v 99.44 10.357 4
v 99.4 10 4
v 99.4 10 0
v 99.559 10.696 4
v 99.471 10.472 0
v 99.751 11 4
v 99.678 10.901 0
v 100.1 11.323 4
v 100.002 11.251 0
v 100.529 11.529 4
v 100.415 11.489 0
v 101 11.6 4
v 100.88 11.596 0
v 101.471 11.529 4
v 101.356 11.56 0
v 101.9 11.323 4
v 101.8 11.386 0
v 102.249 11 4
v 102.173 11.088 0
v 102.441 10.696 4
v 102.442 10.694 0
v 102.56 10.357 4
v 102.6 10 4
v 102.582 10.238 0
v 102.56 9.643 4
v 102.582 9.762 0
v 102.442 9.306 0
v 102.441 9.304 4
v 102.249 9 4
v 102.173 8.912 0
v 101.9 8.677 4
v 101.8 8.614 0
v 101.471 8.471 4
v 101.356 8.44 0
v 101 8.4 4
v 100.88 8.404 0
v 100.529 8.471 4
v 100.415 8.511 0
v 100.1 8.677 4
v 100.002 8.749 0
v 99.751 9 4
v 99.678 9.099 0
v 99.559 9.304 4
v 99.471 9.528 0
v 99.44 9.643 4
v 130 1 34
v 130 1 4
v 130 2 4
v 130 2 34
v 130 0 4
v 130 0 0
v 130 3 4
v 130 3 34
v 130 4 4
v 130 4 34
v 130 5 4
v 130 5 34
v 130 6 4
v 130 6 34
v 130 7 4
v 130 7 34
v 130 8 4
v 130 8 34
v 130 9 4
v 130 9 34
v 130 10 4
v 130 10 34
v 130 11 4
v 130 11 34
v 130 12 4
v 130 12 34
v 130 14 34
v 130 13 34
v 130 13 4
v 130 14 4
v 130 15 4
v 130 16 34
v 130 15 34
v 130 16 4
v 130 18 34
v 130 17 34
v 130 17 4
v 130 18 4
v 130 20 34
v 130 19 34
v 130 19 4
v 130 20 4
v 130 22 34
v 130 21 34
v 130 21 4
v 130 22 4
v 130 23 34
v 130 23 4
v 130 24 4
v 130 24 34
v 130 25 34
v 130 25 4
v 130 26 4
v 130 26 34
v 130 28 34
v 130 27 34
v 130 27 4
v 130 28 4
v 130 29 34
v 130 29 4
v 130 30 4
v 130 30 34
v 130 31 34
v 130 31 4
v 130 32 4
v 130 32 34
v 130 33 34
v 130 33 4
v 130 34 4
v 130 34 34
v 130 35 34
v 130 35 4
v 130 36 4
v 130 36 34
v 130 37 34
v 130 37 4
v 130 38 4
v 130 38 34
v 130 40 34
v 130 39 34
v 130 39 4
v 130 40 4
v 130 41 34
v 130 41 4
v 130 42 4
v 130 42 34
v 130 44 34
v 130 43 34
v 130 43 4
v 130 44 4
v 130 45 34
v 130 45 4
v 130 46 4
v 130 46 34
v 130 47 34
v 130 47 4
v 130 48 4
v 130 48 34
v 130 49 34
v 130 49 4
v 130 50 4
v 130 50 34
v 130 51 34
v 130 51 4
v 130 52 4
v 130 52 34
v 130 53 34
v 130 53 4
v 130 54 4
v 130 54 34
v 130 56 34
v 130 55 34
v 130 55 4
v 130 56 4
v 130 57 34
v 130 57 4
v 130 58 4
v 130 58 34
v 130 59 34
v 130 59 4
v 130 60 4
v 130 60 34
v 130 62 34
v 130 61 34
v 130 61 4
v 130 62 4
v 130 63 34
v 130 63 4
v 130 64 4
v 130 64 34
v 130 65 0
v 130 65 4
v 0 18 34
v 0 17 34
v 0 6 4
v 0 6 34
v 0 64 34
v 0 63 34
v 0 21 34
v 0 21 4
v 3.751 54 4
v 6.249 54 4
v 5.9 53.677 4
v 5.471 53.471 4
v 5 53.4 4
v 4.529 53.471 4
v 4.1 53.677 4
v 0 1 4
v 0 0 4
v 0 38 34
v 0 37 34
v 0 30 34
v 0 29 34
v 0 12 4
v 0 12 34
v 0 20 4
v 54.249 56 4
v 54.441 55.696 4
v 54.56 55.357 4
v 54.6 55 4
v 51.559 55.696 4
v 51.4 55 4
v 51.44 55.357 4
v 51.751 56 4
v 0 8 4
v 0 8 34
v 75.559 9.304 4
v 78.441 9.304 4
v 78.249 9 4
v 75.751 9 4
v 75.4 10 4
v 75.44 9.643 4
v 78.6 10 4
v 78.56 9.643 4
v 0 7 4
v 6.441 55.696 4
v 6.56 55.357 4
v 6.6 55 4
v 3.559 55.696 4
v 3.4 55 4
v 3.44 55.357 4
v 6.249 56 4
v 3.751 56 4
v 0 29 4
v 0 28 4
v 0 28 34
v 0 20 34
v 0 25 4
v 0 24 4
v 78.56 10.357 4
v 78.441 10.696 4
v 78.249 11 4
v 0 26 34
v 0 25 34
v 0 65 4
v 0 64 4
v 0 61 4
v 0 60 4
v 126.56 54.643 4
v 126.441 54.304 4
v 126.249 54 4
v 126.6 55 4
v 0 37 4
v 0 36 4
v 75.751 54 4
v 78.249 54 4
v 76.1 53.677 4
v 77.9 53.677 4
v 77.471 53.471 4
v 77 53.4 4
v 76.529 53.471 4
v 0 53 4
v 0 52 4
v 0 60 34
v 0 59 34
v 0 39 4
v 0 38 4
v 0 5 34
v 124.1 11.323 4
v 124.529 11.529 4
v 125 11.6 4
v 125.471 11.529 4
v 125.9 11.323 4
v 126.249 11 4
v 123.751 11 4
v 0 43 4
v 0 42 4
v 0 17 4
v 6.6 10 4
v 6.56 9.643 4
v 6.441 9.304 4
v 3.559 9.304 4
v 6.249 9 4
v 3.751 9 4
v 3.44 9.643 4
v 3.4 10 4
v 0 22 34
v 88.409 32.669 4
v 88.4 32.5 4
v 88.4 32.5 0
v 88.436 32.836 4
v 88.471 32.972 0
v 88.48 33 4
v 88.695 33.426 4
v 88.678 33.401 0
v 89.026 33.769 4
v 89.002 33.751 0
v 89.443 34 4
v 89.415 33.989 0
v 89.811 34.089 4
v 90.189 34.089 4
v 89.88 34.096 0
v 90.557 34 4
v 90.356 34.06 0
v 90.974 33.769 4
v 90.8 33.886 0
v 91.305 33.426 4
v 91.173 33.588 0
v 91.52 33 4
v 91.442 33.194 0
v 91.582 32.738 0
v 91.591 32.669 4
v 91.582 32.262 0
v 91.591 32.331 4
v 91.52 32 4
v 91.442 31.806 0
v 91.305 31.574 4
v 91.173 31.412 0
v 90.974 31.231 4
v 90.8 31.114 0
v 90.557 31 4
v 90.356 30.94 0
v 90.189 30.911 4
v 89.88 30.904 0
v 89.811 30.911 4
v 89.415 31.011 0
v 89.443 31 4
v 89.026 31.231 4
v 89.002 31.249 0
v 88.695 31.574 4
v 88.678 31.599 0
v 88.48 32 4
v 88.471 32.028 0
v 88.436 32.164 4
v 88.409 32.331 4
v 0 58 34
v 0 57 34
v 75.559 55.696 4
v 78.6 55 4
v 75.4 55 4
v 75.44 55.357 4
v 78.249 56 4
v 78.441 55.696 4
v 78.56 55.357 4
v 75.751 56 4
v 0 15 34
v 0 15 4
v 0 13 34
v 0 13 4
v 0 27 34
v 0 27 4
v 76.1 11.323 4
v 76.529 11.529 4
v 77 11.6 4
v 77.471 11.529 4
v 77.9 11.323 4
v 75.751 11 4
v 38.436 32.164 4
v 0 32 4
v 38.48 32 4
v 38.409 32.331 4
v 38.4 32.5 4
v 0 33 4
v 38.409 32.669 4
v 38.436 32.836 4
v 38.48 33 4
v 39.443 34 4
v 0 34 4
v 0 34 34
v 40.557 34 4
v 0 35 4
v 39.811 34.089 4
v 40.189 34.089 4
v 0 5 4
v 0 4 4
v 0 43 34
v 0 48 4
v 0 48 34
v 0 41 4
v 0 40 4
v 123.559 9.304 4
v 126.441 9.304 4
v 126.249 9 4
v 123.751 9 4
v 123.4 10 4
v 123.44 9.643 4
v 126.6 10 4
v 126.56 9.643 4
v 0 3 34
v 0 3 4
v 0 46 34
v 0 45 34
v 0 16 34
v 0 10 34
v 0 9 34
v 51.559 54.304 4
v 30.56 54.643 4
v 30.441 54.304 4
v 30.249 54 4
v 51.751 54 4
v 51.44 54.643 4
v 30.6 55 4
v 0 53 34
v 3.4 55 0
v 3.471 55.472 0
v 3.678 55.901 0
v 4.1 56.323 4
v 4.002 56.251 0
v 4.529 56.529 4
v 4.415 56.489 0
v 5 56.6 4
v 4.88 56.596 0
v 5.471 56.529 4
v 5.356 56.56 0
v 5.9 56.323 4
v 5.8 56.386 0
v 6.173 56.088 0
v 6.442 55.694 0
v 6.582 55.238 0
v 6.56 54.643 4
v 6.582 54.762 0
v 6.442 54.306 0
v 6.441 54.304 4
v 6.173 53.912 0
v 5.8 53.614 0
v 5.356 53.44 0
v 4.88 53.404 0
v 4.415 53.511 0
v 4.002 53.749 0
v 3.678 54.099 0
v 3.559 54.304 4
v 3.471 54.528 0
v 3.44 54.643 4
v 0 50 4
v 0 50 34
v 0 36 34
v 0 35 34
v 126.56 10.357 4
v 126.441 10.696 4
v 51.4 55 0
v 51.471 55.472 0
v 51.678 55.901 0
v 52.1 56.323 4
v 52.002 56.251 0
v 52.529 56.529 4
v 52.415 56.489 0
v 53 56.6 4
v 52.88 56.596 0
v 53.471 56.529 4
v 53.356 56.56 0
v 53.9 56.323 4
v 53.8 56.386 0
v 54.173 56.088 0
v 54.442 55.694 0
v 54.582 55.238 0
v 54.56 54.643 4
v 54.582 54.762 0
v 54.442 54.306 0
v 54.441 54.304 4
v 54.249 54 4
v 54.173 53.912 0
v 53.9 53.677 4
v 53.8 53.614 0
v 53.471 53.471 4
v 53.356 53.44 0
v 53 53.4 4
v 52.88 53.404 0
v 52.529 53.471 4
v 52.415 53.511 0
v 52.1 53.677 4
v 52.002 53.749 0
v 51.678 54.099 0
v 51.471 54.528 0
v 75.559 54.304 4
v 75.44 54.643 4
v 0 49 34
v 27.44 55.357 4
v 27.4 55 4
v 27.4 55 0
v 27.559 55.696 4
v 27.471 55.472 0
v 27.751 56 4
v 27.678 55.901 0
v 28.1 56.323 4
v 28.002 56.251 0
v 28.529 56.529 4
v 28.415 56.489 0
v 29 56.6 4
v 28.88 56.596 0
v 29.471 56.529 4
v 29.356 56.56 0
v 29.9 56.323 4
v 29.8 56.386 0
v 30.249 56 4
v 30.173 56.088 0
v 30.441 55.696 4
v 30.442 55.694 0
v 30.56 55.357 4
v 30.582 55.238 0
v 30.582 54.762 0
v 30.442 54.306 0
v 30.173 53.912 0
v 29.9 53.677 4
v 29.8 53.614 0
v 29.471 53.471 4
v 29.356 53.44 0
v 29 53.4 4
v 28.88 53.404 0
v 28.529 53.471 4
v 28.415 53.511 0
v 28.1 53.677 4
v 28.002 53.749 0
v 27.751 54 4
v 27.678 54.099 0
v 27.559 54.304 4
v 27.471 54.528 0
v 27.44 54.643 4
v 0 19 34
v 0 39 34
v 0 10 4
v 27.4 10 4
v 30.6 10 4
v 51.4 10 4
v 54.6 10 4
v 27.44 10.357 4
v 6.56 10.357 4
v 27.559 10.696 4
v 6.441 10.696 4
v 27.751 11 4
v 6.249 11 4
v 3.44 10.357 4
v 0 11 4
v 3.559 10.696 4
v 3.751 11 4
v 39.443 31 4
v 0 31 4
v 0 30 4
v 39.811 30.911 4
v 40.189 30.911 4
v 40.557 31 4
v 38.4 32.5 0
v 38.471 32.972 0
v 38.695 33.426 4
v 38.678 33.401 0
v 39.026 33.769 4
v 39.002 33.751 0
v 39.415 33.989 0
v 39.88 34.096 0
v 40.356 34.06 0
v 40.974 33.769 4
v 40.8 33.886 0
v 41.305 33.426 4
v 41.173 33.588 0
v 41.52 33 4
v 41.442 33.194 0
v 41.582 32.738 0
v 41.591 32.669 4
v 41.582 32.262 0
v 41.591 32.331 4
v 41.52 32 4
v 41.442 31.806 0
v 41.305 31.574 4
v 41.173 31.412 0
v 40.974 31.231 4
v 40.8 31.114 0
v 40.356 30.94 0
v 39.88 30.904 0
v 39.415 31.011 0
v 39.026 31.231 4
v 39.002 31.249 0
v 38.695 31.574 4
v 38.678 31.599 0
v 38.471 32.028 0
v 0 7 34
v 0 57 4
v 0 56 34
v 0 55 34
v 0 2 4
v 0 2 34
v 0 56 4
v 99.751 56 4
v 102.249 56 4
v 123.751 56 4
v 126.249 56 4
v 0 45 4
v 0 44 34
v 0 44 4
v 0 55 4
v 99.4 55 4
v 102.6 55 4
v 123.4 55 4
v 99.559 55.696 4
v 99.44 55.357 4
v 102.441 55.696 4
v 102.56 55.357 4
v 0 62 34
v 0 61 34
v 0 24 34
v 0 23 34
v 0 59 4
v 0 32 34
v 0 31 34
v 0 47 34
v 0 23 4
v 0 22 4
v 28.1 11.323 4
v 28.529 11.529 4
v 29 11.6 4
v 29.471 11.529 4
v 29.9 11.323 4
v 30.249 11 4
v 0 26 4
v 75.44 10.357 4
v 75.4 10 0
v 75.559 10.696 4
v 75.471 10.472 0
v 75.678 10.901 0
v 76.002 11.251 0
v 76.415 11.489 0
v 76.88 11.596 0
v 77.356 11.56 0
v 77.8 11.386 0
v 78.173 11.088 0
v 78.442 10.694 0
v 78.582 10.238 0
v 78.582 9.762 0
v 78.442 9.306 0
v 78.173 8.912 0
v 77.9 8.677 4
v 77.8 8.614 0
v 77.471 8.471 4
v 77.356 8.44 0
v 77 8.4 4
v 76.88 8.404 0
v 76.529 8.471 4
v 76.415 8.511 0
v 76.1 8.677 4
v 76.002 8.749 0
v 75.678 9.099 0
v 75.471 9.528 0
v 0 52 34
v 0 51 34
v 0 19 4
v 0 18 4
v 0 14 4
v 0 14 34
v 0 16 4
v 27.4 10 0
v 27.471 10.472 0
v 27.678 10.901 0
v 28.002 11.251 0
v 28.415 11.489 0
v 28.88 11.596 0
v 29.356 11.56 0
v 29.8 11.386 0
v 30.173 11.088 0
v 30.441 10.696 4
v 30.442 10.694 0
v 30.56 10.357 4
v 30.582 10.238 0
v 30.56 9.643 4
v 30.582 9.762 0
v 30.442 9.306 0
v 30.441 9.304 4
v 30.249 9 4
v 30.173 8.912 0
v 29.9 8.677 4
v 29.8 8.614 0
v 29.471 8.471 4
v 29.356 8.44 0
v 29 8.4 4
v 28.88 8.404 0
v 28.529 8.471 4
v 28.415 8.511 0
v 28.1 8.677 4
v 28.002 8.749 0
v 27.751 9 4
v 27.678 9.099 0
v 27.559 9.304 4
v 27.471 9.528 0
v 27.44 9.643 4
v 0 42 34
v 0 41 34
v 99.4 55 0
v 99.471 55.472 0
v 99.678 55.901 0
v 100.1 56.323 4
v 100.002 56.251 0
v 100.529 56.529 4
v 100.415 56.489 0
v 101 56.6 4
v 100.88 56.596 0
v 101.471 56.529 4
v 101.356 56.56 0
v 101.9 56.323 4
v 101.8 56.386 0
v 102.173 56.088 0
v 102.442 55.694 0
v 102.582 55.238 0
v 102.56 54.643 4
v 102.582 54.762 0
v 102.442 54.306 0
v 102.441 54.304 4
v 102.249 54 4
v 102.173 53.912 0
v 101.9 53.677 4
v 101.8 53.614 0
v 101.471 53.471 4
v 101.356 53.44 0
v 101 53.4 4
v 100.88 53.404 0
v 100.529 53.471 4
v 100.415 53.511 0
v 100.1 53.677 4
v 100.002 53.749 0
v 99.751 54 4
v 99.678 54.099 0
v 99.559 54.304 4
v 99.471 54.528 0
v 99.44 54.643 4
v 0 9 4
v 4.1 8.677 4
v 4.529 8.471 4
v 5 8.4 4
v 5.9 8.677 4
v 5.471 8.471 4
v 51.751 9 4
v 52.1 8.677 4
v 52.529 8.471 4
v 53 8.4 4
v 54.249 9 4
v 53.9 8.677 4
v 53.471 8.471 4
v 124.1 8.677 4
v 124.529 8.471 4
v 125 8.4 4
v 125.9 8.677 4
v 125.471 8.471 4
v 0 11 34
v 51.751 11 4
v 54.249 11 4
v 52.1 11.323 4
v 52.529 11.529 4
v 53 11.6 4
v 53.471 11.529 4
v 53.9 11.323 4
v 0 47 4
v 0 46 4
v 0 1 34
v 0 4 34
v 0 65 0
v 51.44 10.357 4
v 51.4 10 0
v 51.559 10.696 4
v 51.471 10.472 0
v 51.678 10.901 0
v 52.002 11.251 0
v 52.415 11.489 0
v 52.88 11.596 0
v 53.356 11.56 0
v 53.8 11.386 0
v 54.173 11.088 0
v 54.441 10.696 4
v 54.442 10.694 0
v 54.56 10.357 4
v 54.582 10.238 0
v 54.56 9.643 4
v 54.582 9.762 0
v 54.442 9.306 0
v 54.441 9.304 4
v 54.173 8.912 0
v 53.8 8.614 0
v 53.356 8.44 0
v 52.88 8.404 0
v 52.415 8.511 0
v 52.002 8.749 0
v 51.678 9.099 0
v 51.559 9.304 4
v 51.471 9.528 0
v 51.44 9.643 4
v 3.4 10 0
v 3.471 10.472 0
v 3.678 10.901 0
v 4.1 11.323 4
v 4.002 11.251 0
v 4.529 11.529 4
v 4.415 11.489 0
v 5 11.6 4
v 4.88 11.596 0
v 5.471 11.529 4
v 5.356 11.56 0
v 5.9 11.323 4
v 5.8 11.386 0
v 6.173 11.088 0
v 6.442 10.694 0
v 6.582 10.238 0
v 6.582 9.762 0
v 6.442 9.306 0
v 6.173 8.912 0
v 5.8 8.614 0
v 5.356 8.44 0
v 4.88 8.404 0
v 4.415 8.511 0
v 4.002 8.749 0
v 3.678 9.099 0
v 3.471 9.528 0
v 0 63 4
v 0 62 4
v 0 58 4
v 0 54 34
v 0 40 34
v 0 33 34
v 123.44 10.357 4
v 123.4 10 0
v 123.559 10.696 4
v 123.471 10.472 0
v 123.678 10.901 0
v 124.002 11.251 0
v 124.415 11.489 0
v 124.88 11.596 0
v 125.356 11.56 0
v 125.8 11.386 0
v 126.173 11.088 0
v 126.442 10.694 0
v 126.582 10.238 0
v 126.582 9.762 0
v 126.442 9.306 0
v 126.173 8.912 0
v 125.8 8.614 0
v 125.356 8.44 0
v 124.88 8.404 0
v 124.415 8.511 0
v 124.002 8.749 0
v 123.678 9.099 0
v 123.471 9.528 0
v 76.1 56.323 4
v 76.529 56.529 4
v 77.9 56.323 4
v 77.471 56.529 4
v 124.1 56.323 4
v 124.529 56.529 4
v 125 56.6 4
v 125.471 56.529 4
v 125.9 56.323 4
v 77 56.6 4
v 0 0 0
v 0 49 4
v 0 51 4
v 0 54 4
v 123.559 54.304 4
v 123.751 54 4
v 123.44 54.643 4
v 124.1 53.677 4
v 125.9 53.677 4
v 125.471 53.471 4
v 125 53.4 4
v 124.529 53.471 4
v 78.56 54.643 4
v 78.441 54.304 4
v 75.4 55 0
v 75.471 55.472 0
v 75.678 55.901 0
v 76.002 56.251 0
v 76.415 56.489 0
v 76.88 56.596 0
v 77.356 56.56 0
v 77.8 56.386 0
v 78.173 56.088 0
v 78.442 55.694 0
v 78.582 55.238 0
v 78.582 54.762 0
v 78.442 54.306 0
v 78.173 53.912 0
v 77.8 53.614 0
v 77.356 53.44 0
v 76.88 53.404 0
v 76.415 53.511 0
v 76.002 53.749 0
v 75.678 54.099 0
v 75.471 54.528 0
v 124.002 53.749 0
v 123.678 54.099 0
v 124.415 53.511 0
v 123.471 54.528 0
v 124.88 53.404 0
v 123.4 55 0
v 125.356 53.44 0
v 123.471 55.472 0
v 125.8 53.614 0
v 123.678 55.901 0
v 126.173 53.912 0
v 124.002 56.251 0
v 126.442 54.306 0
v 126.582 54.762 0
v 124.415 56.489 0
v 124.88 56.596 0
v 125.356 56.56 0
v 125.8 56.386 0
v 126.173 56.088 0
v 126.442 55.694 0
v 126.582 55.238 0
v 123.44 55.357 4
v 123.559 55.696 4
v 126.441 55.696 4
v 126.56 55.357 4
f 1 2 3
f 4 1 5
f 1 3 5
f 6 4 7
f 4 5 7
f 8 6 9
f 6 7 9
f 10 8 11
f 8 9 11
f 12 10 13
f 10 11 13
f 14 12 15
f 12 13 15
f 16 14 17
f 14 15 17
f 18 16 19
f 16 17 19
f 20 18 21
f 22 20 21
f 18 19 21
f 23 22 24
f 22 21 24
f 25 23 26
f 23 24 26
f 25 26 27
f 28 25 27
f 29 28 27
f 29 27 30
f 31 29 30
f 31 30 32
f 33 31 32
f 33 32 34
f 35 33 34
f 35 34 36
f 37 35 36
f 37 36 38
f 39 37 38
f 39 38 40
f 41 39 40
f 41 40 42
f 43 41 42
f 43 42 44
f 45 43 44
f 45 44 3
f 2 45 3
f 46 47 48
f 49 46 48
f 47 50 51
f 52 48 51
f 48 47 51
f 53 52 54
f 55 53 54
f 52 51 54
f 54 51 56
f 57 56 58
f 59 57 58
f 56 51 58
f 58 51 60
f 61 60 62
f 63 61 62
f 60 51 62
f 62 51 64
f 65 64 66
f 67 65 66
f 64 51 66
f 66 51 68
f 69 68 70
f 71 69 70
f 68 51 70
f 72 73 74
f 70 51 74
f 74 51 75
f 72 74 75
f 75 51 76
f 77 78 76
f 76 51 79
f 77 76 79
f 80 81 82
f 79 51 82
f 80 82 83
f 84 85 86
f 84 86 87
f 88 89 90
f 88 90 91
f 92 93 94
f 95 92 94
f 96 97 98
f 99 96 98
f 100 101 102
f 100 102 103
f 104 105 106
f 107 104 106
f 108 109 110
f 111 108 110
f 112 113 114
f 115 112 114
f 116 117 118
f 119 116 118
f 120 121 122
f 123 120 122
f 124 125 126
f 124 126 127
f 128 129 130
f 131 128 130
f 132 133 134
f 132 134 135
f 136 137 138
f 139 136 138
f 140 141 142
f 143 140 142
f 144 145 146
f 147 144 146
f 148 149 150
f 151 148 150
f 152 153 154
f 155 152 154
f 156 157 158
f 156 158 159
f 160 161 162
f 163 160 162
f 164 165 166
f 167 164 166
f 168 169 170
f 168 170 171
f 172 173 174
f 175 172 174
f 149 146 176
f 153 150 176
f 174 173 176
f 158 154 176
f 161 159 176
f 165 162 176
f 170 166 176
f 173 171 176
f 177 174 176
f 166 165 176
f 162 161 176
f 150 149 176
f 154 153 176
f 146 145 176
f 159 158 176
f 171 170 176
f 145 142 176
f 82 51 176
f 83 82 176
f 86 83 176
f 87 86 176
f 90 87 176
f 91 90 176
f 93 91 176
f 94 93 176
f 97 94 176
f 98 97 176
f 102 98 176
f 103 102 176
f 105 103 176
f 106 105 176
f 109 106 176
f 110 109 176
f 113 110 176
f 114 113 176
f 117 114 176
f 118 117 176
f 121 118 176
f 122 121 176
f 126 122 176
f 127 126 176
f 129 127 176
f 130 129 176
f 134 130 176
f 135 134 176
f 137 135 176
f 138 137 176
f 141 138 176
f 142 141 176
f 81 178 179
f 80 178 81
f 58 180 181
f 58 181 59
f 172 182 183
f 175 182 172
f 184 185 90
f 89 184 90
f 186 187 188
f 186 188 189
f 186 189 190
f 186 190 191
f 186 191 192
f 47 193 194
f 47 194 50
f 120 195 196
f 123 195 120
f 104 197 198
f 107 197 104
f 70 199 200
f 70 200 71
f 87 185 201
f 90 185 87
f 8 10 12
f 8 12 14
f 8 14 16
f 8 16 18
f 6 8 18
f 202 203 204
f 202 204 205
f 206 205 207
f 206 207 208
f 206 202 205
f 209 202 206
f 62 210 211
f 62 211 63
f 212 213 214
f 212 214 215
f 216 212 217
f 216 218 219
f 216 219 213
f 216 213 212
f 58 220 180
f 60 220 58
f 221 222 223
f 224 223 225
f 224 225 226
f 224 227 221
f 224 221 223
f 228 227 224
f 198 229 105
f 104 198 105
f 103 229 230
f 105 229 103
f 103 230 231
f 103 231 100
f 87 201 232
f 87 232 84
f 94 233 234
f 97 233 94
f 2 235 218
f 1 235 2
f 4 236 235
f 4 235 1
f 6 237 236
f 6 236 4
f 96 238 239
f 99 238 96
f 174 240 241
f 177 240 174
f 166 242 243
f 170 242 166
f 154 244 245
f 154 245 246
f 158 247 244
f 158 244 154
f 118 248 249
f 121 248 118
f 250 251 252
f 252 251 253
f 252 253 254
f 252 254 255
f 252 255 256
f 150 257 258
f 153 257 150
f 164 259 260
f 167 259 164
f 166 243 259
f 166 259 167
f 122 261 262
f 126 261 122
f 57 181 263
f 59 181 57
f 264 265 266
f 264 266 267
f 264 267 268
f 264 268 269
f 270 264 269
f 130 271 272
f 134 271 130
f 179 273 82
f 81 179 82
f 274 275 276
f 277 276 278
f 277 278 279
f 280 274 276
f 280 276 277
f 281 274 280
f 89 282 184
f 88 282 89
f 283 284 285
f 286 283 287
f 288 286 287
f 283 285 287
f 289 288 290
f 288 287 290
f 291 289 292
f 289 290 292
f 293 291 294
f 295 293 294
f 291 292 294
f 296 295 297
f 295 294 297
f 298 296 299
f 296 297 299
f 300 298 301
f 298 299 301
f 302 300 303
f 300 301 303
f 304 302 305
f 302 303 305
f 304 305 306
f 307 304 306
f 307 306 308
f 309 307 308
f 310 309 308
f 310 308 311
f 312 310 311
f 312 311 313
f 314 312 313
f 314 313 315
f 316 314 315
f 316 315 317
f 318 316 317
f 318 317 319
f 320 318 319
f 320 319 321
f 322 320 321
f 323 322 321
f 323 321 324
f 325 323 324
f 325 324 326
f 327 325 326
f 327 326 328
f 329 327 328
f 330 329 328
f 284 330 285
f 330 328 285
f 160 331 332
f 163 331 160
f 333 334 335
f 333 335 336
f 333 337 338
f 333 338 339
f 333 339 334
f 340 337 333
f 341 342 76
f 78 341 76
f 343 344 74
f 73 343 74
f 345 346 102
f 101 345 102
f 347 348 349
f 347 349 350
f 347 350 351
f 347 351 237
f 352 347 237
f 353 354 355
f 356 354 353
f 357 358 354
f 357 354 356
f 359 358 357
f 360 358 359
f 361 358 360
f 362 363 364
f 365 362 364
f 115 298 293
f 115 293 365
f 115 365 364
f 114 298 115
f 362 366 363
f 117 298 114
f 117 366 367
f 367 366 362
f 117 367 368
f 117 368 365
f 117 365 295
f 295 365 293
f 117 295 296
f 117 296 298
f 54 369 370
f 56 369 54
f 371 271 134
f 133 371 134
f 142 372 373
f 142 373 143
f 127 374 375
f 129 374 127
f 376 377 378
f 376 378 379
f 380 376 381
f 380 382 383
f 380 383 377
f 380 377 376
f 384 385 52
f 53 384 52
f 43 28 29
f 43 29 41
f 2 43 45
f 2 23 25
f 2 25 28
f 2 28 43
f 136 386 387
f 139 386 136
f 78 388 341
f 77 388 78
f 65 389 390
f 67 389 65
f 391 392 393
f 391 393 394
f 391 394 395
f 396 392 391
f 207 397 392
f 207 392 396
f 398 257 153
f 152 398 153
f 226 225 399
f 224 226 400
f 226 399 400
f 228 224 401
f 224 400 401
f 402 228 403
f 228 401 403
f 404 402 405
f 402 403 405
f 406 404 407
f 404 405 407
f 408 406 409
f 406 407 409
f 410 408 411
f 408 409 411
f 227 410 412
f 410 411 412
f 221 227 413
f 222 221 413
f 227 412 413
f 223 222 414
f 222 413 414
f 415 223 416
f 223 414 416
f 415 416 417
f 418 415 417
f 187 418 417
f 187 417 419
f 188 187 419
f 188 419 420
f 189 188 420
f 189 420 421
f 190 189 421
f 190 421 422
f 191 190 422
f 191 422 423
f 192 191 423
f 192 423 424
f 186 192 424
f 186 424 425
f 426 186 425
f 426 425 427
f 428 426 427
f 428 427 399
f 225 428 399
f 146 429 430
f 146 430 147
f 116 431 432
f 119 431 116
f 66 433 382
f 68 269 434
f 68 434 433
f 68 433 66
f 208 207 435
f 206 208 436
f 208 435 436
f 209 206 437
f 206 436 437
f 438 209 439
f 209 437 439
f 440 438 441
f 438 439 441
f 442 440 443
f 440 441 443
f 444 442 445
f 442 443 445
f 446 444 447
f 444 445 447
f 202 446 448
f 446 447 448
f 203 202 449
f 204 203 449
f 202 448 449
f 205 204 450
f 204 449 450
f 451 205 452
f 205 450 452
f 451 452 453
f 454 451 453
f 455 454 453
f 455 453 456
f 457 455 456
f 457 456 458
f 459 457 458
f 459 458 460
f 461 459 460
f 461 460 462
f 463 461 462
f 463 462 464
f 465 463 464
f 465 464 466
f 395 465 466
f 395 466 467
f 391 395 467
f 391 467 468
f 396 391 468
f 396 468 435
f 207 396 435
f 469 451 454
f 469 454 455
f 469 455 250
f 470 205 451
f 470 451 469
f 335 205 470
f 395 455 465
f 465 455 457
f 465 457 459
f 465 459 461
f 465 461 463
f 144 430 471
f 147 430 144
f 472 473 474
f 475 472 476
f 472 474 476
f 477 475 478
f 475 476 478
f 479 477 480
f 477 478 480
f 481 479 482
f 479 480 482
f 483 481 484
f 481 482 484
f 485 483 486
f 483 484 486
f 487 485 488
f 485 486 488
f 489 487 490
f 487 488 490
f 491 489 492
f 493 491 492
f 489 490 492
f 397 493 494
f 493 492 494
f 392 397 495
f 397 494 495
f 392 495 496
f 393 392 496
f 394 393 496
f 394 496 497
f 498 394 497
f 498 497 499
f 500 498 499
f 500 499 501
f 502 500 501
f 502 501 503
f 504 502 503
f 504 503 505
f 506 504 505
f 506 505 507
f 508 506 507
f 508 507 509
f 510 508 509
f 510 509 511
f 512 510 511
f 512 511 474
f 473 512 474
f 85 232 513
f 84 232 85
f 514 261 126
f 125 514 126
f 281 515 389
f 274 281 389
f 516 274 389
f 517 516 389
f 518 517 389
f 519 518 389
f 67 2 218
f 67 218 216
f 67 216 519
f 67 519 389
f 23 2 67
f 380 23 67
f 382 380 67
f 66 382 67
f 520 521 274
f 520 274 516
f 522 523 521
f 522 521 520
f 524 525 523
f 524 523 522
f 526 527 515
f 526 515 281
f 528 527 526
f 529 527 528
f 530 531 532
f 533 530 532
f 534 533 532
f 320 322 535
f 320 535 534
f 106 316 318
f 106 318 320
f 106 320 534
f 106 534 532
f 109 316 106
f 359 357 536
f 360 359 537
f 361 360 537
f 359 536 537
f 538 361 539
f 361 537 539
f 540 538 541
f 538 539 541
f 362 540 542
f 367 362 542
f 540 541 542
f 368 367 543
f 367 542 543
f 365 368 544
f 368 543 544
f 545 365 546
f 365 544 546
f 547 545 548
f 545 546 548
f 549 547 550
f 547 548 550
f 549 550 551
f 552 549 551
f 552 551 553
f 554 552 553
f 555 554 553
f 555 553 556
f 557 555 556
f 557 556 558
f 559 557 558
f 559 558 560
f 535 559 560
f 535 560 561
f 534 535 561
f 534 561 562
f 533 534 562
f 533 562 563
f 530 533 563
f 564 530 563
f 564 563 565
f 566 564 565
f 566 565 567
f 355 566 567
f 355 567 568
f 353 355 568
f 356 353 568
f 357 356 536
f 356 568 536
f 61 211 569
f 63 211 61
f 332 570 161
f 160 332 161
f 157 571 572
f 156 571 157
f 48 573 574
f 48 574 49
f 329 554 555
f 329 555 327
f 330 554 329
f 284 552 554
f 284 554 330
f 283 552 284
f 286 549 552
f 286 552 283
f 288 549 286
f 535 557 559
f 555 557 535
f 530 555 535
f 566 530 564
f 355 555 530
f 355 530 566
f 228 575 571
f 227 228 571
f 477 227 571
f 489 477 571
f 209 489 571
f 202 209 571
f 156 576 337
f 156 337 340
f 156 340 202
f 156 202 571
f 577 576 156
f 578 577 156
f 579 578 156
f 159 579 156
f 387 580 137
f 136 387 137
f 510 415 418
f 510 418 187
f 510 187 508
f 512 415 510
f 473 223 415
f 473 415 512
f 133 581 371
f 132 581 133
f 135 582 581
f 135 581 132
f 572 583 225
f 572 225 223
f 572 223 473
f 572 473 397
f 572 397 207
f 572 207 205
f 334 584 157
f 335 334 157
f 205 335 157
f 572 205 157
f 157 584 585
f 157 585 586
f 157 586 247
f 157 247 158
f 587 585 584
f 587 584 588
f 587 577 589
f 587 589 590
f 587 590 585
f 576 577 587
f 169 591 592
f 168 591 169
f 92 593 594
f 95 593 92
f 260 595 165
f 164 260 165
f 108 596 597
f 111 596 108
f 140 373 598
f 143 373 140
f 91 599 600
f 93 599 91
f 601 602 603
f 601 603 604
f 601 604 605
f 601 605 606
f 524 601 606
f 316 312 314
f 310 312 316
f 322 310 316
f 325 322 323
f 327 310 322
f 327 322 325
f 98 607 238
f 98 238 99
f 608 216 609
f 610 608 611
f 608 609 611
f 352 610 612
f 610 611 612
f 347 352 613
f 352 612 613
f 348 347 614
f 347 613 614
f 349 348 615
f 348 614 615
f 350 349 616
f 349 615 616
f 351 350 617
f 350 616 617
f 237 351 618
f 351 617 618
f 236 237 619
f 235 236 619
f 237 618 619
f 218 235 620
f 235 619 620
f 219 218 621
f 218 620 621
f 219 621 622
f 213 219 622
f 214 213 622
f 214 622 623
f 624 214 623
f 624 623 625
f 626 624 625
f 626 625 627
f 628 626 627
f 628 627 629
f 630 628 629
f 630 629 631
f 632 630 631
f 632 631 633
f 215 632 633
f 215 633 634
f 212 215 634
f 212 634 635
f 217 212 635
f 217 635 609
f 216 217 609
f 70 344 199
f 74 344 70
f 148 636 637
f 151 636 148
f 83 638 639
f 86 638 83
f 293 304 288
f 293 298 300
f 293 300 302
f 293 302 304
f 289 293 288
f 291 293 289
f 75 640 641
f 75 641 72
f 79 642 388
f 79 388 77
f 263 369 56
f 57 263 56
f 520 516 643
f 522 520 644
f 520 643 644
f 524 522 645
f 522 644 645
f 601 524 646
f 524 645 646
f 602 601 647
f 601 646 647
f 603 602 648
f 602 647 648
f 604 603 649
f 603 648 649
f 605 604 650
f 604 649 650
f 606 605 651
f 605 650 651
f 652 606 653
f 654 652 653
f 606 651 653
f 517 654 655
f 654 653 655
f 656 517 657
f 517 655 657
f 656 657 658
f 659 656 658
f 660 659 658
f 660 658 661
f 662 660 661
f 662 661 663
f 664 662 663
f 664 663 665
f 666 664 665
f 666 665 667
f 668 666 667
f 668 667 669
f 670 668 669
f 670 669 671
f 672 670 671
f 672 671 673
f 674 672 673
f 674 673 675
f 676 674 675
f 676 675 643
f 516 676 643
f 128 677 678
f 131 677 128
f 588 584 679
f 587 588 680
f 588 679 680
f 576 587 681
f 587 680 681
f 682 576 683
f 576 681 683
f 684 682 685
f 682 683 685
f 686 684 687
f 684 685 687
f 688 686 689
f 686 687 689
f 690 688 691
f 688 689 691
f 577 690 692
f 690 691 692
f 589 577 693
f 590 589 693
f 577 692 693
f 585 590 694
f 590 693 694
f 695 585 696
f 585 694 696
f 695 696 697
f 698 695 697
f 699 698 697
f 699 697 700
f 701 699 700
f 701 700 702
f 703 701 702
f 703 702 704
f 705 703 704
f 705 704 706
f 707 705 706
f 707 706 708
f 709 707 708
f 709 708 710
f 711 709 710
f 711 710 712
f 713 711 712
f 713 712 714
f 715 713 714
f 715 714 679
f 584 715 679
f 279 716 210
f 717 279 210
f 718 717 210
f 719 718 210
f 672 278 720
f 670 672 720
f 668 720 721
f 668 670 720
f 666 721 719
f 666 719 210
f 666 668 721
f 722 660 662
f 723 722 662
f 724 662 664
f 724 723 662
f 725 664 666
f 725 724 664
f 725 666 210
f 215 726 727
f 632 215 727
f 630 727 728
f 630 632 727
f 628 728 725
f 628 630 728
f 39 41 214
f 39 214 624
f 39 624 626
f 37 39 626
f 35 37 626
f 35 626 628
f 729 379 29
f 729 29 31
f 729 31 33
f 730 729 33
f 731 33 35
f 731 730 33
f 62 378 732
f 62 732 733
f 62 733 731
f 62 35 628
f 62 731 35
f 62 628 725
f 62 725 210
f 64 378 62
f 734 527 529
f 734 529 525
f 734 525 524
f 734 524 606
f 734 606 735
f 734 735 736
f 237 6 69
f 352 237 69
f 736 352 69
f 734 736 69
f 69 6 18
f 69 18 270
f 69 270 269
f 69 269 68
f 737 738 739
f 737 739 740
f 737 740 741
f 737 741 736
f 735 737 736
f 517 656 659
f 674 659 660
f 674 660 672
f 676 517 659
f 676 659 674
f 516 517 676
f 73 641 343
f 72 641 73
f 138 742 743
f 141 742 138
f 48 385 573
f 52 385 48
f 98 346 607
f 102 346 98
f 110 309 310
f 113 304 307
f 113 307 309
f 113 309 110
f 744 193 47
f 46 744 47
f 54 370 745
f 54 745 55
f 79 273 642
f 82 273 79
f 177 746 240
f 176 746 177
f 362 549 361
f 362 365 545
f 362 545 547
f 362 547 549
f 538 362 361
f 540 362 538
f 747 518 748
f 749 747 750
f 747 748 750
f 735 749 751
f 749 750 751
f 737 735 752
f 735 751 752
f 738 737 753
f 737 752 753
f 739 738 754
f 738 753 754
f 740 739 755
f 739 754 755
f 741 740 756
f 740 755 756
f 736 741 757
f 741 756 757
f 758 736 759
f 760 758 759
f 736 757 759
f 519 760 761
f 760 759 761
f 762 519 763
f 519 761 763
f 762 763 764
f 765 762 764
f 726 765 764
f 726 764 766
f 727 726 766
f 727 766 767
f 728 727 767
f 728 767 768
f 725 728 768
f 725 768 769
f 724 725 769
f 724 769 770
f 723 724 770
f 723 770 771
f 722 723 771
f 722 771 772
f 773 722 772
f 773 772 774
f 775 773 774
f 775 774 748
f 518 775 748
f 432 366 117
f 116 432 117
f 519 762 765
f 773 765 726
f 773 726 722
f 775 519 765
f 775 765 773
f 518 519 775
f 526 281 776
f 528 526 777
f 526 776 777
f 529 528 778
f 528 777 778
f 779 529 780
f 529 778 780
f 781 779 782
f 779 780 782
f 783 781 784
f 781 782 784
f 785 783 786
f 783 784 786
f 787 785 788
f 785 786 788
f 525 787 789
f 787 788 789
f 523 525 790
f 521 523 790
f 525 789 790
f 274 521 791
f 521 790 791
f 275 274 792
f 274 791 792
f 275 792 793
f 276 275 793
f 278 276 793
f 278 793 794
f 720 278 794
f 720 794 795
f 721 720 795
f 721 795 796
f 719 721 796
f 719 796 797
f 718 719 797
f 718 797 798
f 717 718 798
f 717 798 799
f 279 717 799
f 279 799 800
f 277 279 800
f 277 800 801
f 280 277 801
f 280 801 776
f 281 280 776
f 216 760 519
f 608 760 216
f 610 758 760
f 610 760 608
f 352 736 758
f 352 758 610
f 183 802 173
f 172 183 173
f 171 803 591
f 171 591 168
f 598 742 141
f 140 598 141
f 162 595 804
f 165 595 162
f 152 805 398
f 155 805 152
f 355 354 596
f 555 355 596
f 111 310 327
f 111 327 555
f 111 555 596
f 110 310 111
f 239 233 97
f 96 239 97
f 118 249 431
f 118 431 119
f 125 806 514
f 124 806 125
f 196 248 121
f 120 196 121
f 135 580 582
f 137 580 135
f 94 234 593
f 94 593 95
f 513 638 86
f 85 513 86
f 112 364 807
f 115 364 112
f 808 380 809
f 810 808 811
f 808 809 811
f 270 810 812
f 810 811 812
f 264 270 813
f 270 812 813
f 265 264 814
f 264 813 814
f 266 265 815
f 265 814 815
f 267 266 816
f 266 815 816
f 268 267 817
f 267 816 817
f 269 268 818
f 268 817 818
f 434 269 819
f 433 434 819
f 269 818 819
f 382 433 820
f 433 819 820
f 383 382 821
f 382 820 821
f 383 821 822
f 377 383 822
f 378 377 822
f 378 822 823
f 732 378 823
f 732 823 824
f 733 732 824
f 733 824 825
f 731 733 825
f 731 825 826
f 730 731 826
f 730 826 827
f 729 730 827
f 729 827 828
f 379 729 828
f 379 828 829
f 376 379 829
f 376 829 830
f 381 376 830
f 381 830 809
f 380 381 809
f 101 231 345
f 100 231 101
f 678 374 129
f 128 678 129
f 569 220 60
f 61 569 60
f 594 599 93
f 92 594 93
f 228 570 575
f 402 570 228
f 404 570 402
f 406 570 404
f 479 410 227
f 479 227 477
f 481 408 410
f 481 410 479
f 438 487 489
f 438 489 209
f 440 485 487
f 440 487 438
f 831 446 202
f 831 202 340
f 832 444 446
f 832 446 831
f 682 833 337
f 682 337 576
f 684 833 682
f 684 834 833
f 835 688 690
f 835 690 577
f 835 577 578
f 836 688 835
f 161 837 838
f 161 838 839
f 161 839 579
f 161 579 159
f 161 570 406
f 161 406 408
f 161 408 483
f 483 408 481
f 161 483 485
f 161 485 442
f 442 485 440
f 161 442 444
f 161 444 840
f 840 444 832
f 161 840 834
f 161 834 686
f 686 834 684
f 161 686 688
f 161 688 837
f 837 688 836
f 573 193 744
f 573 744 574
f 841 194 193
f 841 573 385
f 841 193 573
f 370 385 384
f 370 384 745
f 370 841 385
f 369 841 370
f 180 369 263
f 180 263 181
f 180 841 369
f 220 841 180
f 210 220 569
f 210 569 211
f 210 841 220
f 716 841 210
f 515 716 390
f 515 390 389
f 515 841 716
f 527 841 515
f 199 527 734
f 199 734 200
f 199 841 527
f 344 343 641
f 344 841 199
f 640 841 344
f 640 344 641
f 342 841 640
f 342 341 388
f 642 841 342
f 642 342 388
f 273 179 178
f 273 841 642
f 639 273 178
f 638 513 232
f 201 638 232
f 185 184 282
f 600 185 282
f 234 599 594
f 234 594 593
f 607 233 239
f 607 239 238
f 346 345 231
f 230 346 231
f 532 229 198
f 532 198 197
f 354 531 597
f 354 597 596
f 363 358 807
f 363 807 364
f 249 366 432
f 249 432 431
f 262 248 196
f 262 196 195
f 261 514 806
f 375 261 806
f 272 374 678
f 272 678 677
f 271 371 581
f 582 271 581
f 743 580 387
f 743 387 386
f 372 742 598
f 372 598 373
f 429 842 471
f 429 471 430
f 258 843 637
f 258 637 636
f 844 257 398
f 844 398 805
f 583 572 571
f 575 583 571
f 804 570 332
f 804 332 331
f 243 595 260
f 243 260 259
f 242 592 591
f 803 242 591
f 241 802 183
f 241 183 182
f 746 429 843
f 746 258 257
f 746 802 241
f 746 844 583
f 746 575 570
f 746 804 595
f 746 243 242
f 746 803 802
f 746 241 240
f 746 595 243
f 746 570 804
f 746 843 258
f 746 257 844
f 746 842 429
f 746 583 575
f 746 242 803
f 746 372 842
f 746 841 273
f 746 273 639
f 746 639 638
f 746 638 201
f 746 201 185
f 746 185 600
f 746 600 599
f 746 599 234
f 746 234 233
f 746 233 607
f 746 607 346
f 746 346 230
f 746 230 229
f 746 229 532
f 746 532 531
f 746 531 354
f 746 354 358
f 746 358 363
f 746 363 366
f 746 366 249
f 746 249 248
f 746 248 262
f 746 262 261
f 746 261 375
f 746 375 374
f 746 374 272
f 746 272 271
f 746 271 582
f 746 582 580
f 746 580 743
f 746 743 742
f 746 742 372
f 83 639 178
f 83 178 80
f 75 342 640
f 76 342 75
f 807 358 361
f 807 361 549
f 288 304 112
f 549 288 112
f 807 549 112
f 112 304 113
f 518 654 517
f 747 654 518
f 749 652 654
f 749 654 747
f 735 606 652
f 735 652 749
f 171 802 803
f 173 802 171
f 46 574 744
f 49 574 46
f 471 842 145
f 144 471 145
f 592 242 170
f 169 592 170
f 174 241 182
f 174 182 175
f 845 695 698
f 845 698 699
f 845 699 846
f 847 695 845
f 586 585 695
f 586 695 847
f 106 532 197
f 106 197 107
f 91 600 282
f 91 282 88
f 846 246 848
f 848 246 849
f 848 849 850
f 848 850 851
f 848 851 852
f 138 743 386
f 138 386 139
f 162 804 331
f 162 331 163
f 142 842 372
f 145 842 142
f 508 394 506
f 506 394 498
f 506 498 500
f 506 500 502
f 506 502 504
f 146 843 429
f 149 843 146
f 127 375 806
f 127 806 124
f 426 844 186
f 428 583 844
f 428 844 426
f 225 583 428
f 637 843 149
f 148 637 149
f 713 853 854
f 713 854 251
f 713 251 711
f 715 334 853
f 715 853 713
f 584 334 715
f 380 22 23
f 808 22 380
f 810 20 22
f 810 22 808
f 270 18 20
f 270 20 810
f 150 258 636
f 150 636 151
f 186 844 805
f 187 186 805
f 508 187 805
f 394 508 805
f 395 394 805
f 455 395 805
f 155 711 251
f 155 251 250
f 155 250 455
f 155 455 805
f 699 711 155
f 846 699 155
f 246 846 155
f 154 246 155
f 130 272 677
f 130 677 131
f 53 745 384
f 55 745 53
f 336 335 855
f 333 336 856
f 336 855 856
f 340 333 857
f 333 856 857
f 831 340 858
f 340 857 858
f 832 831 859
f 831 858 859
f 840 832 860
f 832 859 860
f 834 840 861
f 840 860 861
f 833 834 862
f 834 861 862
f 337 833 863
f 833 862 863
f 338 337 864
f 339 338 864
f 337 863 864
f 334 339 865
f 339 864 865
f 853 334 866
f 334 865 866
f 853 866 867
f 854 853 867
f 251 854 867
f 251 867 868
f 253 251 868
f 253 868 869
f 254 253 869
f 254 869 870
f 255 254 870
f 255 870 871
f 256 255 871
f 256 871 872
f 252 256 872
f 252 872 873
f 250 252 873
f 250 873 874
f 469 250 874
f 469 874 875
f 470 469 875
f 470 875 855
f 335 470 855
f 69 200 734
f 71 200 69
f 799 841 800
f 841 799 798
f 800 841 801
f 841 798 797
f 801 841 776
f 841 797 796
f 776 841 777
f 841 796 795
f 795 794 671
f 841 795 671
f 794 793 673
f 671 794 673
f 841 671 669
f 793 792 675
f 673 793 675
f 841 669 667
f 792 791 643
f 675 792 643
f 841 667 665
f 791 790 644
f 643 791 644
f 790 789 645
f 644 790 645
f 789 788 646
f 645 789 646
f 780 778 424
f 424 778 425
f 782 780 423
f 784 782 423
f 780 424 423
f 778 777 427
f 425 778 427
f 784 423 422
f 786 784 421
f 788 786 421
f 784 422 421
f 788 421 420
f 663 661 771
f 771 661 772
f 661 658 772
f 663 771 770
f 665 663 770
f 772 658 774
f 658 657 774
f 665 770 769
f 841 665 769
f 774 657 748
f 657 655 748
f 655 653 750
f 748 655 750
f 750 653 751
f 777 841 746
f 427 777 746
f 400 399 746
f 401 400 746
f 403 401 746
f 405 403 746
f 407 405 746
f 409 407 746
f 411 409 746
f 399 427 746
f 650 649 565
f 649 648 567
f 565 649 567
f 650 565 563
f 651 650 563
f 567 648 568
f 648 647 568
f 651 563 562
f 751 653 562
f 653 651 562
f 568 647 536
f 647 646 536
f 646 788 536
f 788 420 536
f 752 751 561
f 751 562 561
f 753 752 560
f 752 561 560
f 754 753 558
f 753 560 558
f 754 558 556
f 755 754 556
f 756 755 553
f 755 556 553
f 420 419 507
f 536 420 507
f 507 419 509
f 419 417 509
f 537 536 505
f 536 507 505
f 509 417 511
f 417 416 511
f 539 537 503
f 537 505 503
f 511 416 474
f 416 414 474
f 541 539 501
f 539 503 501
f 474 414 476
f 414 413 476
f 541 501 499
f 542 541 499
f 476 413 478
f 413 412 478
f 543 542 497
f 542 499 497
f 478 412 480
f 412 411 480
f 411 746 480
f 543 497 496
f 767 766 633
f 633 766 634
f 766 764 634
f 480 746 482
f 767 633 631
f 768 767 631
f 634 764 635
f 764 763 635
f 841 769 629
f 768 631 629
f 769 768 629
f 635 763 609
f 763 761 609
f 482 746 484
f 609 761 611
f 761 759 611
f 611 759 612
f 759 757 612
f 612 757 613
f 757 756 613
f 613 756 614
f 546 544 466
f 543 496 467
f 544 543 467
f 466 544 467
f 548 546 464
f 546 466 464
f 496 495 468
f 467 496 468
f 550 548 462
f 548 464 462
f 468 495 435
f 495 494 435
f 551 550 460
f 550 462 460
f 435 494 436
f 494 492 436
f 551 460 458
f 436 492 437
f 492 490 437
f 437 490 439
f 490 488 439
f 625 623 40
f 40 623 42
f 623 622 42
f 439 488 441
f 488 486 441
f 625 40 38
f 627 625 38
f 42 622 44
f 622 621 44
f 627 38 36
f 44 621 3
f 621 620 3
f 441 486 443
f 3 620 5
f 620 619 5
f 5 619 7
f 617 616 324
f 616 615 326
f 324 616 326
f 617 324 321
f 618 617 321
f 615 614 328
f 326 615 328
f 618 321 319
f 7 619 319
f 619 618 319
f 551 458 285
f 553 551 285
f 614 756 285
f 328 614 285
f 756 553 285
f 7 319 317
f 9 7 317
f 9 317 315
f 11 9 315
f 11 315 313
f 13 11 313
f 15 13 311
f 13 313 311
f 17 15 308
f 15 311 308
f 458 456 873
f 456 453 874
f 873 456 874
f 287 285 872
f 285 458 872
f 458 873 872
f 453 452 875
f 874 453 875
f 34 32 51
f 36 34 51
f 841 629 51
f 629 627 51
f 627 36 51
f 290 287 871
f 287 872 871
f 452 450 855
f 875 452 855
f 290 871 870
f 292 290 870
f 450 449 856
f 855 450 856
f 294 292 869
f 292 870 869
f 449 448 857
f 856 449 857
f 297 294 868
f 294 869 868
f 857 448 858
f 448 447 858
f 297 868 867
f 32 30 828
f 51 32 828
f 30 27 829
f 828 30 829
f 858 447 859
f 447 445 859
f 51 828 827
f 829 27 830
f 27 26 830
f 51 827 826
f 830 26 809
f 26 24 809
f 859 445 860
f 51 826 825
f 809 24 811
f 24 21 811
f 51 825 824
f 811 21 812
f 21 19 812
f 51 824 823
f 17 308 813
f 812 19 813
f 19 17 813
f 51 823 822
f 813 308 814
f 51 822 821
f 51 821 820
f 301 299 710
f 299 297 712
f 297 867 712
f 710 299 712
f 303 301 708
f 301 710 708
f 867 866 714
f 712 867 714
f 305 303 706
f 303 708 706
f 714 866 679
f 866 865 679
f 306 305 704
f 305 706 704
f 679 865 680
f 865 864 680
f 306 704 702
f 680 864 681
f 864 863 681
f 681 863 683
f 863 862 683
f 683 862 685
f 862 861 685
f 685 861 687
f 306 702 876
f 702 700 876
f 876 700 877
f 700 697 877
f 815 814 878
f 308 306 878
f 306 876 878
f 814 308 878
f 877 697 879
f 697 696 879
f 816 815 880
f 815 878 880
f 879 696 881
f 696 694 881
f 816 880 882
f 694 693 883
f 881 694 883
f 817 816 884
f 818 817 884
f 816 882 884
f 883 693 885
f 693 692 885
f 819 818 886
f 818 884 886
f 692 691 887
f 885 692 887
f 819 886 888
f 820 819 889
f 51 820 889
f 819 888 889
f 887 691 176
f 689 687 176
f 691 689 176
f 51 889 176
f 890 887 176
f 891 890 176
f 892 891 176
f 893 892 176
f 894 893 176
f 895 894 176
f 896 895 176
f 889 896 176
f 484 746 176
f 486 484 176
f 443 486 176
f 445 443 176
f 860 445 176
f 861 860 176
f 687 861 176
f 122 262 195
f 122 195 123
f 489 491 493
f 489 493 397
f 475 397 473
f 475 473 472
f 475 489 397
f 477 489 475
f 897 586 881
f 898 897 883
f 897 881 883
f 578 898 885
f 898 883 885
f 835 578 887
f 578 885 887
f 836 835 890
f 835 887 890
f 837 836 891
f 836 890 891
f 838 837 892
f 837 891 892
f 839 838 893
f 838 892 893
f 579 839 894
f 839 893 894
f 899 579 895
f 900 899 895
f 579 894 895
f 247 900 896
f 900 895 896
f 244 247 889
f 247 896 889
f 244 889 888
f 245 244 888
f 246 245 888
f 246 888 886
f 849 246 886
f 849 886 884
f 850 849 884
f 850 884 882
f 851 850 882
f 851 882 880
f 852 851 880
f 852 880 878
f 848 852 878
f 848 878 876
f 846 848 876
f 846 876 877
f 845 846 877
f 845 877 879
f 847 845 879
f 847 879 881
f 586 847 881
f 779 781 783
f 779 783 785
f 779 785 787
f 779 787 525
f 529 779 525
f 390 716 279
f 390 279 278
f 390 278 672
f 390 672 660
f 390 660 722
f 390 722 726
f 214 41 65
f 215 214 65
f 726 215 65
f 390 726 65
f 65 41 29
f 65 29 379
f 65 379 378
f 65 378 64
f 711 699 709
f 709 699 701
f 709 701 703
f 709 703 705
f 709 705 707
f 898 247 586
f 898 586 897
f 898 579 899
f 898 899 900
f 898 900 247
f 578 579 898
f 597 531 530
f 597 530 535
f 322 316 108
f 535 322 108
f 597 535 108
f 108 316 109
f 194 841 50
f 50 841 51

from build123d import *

# Parameters (mm, degrees)
ESQUISSE1_W             = 130
ESQUISSE1_H             = 65
BOSS_EXTRU_1_DEPTH      = 4
ESQUISSE2_W             = 130
ESQUISSE2_H             = 1
BOSS_EXTRU_2_DEPTH      = 30
ESQUISSE3_R             = 1.6
ENL_V_MAT_EXTRU_5_DEPTH = 4


with BuildPart() as part:
    # Esquisse1 → Boss.-Extru.1 (new body)
    with BuildSketch(Plane.XY):
        with Locations((65, 32.5)):
            Rectangle(ESQUISSE1_W, ESQUISSE1_H)
    extrude(amount=BOSS_EXTRU_1_DEPTH)

    # Esquisse2 → Boss.-Extru.2 (add)
    with BuildSketch(Plane.XY.offset(4)):
        with Locations((65, 1.5)):
            Rectangle(ESQUISSE2_W, ESQUISSE2_H)
        with Locations((65, 3.5)):
            Rectangle(ESQUISSE2_W, ESQUISSE2_H)
        with Locations((65, 5.5)):
            Rectangle(ESQUISSE2_W, ESQUISSE2_H)
        with Locations((65, 7.5)):
            Rectangle(ESQUISSE2_W, ESQUISSE2_H)
        with Locations((65, 9.5)):
            Rectangle(ESQUISSE2_W, ESQUISSE2_H)
        with Locations((65, 11.5)):
            Rectangle(ESQUISSE2_W, ESQUISSE2_H)
        with Locations((65, 13.5)):
            Rectangle(ESQUISSE2_W, ESQUISSE2_H)
        with Locations((65, 15.5)):
            Rectangle(ESQUISSE2_W, ESQUISSE2_H)
        with Locations((65, 17.5)):
            Rectangle(ESQUISSE2_W, ESQUISSE2_H)
        with Locations((65, 19.5)):
            Rectangle(ESQUISSE2_W, ESQUISSE2_H)
        with Locations((65, 21.5)):
            Rectangle(ESQUISSE2_W, ESQUISSE2_H)
        with Locations((65, 23.5)):
            Rectangle(ESQUISSE2_W, ESQUISSE2_H)
        with Locations((65, 25.5)):
            Rectangle(ESQUISSE2_W, ESQUISSE2_H)
        with Locations((65, 27.5)):
            Rectangle(ESQUISSE2_W, ESQUISSE2_H)
        with Locations((65, 29.5)):
            Rectangle(ESQUISSE2_W, ESQUISSE2_H)
        with Locations((65, 31.5)):
            Rectangle(ESQUISSE2_W, ESQUISSE2_H)
        with Locations((65, 33.5)):
            Rectangle(ESQUISSE2_W, ESQUISSE2_H)
        with Locations((65, 35.5)):
            Rectangle(ESQUISSE2_W, ESQUISSE2_H)
        with Locations((65, 37.5)):
            Rectangle(ESQUISSE2_W, ESQUISSE2_H)
        with Locations((65, 39.5)):
            Rectangle(ESQUISSE2_W, ESQUISSE2_H)
        with Locations((65, 41.5)):
            Rectangle(ESQUISSE2_W, ESQUISSE2_H)
        with Locations((65, 43.5)):
            Rectangle(ESQUISSE2_W, ESQUISSE2_H)
        with Locations((65, 45.5)):
            Rectangle(ESQUISSE2_W, ESQUISSE2_H)
        with Locations((65, 47.5)):
            Rectangle(ESQUISSE2_W, ESQUISSE2_H)
        with Locations((65, 49.5)):
            Rectangle(ESQUISSE2_W, ESQUISSE2_H)
        with Locations((65, 51.5)):
            Rectangle(ESQUISSE2_W, ESQUISSE2_H)
        with Locations((65, 53.5)):
            Rectangle(ESQUISSE2_W, ESQUISSE2_H)
        with Locations((65, 55.5)):
            Rectangle(ESQUISSE2_W, ESQUISSE2_H)
        with Locations((65, 57.5)):
            Rectangle(ESQUISSE2_W, ESQUISSE2_H)
        with Locations((65, 59.5)):
            Rectangle(ESQUISSE2_W, ESQUISSE2_H)
        with Locations((65, 61.5)):
            Rectangle(ESQUISSE2_W, ESQUISSE2_H)
        with Locations((65, 63.5)):
            Rectangle(ESQUISSE2_W, ESQUISSE2_H)
    extrude(amount=BOSS_EXTRU_2_DEPTH)

    # Esquisse3 → Enlèv. mat.-Extru.5 (cut)
    with BuildSketch(Plane(origin=(0, 0, 0), x_dir=(-1, 0, 0), z_dir=(0, 0, -1))):
        with Locations((-5, 55)):
            Circle(ESQUISSE3_R)
        with Locations((-29, 55)):
            Circle(ESQUISSE3_R)
        with Locations((-53, 55)):
            Circle(ESQUISSE3_R)
        with Locations((-77, 55)):
            Circle(ESQUISSE3_R)
        with Locations((-101, 55)):
            Circle(ESQUISSE3_R)
        with Locations((-125, 55)):
            Circle(ESQUISSE3_R)
        with Locations((-5, 10)):
            Circle(ESQUISSE3_R)
        with Locations((-29, 10)):
            Circle(ESQUISSE3_R)
        with Locations((-53, 10)):
            Circle(ESQUISSE3_R)
        with Locations((-77, 10)):
            Circle(ESQUISSE3_R)
        with Locations((-101, 10)):
            Circle(ESQUISSE3_R)
        with Locations((-125, 10)):
            Circle(ESQUISSE3_R)
        with Locations((-40, 32.5)):
            Circle(ESQUISSE3_R)
        with Locations((-90, 32.5)):
            Circle(ESQUISSE3_R)
    extrude(amount=-ENL_V_MAT_EXTRU_5_DEPTH, mode=Mode.SUBTRACT)


solid = part.part
